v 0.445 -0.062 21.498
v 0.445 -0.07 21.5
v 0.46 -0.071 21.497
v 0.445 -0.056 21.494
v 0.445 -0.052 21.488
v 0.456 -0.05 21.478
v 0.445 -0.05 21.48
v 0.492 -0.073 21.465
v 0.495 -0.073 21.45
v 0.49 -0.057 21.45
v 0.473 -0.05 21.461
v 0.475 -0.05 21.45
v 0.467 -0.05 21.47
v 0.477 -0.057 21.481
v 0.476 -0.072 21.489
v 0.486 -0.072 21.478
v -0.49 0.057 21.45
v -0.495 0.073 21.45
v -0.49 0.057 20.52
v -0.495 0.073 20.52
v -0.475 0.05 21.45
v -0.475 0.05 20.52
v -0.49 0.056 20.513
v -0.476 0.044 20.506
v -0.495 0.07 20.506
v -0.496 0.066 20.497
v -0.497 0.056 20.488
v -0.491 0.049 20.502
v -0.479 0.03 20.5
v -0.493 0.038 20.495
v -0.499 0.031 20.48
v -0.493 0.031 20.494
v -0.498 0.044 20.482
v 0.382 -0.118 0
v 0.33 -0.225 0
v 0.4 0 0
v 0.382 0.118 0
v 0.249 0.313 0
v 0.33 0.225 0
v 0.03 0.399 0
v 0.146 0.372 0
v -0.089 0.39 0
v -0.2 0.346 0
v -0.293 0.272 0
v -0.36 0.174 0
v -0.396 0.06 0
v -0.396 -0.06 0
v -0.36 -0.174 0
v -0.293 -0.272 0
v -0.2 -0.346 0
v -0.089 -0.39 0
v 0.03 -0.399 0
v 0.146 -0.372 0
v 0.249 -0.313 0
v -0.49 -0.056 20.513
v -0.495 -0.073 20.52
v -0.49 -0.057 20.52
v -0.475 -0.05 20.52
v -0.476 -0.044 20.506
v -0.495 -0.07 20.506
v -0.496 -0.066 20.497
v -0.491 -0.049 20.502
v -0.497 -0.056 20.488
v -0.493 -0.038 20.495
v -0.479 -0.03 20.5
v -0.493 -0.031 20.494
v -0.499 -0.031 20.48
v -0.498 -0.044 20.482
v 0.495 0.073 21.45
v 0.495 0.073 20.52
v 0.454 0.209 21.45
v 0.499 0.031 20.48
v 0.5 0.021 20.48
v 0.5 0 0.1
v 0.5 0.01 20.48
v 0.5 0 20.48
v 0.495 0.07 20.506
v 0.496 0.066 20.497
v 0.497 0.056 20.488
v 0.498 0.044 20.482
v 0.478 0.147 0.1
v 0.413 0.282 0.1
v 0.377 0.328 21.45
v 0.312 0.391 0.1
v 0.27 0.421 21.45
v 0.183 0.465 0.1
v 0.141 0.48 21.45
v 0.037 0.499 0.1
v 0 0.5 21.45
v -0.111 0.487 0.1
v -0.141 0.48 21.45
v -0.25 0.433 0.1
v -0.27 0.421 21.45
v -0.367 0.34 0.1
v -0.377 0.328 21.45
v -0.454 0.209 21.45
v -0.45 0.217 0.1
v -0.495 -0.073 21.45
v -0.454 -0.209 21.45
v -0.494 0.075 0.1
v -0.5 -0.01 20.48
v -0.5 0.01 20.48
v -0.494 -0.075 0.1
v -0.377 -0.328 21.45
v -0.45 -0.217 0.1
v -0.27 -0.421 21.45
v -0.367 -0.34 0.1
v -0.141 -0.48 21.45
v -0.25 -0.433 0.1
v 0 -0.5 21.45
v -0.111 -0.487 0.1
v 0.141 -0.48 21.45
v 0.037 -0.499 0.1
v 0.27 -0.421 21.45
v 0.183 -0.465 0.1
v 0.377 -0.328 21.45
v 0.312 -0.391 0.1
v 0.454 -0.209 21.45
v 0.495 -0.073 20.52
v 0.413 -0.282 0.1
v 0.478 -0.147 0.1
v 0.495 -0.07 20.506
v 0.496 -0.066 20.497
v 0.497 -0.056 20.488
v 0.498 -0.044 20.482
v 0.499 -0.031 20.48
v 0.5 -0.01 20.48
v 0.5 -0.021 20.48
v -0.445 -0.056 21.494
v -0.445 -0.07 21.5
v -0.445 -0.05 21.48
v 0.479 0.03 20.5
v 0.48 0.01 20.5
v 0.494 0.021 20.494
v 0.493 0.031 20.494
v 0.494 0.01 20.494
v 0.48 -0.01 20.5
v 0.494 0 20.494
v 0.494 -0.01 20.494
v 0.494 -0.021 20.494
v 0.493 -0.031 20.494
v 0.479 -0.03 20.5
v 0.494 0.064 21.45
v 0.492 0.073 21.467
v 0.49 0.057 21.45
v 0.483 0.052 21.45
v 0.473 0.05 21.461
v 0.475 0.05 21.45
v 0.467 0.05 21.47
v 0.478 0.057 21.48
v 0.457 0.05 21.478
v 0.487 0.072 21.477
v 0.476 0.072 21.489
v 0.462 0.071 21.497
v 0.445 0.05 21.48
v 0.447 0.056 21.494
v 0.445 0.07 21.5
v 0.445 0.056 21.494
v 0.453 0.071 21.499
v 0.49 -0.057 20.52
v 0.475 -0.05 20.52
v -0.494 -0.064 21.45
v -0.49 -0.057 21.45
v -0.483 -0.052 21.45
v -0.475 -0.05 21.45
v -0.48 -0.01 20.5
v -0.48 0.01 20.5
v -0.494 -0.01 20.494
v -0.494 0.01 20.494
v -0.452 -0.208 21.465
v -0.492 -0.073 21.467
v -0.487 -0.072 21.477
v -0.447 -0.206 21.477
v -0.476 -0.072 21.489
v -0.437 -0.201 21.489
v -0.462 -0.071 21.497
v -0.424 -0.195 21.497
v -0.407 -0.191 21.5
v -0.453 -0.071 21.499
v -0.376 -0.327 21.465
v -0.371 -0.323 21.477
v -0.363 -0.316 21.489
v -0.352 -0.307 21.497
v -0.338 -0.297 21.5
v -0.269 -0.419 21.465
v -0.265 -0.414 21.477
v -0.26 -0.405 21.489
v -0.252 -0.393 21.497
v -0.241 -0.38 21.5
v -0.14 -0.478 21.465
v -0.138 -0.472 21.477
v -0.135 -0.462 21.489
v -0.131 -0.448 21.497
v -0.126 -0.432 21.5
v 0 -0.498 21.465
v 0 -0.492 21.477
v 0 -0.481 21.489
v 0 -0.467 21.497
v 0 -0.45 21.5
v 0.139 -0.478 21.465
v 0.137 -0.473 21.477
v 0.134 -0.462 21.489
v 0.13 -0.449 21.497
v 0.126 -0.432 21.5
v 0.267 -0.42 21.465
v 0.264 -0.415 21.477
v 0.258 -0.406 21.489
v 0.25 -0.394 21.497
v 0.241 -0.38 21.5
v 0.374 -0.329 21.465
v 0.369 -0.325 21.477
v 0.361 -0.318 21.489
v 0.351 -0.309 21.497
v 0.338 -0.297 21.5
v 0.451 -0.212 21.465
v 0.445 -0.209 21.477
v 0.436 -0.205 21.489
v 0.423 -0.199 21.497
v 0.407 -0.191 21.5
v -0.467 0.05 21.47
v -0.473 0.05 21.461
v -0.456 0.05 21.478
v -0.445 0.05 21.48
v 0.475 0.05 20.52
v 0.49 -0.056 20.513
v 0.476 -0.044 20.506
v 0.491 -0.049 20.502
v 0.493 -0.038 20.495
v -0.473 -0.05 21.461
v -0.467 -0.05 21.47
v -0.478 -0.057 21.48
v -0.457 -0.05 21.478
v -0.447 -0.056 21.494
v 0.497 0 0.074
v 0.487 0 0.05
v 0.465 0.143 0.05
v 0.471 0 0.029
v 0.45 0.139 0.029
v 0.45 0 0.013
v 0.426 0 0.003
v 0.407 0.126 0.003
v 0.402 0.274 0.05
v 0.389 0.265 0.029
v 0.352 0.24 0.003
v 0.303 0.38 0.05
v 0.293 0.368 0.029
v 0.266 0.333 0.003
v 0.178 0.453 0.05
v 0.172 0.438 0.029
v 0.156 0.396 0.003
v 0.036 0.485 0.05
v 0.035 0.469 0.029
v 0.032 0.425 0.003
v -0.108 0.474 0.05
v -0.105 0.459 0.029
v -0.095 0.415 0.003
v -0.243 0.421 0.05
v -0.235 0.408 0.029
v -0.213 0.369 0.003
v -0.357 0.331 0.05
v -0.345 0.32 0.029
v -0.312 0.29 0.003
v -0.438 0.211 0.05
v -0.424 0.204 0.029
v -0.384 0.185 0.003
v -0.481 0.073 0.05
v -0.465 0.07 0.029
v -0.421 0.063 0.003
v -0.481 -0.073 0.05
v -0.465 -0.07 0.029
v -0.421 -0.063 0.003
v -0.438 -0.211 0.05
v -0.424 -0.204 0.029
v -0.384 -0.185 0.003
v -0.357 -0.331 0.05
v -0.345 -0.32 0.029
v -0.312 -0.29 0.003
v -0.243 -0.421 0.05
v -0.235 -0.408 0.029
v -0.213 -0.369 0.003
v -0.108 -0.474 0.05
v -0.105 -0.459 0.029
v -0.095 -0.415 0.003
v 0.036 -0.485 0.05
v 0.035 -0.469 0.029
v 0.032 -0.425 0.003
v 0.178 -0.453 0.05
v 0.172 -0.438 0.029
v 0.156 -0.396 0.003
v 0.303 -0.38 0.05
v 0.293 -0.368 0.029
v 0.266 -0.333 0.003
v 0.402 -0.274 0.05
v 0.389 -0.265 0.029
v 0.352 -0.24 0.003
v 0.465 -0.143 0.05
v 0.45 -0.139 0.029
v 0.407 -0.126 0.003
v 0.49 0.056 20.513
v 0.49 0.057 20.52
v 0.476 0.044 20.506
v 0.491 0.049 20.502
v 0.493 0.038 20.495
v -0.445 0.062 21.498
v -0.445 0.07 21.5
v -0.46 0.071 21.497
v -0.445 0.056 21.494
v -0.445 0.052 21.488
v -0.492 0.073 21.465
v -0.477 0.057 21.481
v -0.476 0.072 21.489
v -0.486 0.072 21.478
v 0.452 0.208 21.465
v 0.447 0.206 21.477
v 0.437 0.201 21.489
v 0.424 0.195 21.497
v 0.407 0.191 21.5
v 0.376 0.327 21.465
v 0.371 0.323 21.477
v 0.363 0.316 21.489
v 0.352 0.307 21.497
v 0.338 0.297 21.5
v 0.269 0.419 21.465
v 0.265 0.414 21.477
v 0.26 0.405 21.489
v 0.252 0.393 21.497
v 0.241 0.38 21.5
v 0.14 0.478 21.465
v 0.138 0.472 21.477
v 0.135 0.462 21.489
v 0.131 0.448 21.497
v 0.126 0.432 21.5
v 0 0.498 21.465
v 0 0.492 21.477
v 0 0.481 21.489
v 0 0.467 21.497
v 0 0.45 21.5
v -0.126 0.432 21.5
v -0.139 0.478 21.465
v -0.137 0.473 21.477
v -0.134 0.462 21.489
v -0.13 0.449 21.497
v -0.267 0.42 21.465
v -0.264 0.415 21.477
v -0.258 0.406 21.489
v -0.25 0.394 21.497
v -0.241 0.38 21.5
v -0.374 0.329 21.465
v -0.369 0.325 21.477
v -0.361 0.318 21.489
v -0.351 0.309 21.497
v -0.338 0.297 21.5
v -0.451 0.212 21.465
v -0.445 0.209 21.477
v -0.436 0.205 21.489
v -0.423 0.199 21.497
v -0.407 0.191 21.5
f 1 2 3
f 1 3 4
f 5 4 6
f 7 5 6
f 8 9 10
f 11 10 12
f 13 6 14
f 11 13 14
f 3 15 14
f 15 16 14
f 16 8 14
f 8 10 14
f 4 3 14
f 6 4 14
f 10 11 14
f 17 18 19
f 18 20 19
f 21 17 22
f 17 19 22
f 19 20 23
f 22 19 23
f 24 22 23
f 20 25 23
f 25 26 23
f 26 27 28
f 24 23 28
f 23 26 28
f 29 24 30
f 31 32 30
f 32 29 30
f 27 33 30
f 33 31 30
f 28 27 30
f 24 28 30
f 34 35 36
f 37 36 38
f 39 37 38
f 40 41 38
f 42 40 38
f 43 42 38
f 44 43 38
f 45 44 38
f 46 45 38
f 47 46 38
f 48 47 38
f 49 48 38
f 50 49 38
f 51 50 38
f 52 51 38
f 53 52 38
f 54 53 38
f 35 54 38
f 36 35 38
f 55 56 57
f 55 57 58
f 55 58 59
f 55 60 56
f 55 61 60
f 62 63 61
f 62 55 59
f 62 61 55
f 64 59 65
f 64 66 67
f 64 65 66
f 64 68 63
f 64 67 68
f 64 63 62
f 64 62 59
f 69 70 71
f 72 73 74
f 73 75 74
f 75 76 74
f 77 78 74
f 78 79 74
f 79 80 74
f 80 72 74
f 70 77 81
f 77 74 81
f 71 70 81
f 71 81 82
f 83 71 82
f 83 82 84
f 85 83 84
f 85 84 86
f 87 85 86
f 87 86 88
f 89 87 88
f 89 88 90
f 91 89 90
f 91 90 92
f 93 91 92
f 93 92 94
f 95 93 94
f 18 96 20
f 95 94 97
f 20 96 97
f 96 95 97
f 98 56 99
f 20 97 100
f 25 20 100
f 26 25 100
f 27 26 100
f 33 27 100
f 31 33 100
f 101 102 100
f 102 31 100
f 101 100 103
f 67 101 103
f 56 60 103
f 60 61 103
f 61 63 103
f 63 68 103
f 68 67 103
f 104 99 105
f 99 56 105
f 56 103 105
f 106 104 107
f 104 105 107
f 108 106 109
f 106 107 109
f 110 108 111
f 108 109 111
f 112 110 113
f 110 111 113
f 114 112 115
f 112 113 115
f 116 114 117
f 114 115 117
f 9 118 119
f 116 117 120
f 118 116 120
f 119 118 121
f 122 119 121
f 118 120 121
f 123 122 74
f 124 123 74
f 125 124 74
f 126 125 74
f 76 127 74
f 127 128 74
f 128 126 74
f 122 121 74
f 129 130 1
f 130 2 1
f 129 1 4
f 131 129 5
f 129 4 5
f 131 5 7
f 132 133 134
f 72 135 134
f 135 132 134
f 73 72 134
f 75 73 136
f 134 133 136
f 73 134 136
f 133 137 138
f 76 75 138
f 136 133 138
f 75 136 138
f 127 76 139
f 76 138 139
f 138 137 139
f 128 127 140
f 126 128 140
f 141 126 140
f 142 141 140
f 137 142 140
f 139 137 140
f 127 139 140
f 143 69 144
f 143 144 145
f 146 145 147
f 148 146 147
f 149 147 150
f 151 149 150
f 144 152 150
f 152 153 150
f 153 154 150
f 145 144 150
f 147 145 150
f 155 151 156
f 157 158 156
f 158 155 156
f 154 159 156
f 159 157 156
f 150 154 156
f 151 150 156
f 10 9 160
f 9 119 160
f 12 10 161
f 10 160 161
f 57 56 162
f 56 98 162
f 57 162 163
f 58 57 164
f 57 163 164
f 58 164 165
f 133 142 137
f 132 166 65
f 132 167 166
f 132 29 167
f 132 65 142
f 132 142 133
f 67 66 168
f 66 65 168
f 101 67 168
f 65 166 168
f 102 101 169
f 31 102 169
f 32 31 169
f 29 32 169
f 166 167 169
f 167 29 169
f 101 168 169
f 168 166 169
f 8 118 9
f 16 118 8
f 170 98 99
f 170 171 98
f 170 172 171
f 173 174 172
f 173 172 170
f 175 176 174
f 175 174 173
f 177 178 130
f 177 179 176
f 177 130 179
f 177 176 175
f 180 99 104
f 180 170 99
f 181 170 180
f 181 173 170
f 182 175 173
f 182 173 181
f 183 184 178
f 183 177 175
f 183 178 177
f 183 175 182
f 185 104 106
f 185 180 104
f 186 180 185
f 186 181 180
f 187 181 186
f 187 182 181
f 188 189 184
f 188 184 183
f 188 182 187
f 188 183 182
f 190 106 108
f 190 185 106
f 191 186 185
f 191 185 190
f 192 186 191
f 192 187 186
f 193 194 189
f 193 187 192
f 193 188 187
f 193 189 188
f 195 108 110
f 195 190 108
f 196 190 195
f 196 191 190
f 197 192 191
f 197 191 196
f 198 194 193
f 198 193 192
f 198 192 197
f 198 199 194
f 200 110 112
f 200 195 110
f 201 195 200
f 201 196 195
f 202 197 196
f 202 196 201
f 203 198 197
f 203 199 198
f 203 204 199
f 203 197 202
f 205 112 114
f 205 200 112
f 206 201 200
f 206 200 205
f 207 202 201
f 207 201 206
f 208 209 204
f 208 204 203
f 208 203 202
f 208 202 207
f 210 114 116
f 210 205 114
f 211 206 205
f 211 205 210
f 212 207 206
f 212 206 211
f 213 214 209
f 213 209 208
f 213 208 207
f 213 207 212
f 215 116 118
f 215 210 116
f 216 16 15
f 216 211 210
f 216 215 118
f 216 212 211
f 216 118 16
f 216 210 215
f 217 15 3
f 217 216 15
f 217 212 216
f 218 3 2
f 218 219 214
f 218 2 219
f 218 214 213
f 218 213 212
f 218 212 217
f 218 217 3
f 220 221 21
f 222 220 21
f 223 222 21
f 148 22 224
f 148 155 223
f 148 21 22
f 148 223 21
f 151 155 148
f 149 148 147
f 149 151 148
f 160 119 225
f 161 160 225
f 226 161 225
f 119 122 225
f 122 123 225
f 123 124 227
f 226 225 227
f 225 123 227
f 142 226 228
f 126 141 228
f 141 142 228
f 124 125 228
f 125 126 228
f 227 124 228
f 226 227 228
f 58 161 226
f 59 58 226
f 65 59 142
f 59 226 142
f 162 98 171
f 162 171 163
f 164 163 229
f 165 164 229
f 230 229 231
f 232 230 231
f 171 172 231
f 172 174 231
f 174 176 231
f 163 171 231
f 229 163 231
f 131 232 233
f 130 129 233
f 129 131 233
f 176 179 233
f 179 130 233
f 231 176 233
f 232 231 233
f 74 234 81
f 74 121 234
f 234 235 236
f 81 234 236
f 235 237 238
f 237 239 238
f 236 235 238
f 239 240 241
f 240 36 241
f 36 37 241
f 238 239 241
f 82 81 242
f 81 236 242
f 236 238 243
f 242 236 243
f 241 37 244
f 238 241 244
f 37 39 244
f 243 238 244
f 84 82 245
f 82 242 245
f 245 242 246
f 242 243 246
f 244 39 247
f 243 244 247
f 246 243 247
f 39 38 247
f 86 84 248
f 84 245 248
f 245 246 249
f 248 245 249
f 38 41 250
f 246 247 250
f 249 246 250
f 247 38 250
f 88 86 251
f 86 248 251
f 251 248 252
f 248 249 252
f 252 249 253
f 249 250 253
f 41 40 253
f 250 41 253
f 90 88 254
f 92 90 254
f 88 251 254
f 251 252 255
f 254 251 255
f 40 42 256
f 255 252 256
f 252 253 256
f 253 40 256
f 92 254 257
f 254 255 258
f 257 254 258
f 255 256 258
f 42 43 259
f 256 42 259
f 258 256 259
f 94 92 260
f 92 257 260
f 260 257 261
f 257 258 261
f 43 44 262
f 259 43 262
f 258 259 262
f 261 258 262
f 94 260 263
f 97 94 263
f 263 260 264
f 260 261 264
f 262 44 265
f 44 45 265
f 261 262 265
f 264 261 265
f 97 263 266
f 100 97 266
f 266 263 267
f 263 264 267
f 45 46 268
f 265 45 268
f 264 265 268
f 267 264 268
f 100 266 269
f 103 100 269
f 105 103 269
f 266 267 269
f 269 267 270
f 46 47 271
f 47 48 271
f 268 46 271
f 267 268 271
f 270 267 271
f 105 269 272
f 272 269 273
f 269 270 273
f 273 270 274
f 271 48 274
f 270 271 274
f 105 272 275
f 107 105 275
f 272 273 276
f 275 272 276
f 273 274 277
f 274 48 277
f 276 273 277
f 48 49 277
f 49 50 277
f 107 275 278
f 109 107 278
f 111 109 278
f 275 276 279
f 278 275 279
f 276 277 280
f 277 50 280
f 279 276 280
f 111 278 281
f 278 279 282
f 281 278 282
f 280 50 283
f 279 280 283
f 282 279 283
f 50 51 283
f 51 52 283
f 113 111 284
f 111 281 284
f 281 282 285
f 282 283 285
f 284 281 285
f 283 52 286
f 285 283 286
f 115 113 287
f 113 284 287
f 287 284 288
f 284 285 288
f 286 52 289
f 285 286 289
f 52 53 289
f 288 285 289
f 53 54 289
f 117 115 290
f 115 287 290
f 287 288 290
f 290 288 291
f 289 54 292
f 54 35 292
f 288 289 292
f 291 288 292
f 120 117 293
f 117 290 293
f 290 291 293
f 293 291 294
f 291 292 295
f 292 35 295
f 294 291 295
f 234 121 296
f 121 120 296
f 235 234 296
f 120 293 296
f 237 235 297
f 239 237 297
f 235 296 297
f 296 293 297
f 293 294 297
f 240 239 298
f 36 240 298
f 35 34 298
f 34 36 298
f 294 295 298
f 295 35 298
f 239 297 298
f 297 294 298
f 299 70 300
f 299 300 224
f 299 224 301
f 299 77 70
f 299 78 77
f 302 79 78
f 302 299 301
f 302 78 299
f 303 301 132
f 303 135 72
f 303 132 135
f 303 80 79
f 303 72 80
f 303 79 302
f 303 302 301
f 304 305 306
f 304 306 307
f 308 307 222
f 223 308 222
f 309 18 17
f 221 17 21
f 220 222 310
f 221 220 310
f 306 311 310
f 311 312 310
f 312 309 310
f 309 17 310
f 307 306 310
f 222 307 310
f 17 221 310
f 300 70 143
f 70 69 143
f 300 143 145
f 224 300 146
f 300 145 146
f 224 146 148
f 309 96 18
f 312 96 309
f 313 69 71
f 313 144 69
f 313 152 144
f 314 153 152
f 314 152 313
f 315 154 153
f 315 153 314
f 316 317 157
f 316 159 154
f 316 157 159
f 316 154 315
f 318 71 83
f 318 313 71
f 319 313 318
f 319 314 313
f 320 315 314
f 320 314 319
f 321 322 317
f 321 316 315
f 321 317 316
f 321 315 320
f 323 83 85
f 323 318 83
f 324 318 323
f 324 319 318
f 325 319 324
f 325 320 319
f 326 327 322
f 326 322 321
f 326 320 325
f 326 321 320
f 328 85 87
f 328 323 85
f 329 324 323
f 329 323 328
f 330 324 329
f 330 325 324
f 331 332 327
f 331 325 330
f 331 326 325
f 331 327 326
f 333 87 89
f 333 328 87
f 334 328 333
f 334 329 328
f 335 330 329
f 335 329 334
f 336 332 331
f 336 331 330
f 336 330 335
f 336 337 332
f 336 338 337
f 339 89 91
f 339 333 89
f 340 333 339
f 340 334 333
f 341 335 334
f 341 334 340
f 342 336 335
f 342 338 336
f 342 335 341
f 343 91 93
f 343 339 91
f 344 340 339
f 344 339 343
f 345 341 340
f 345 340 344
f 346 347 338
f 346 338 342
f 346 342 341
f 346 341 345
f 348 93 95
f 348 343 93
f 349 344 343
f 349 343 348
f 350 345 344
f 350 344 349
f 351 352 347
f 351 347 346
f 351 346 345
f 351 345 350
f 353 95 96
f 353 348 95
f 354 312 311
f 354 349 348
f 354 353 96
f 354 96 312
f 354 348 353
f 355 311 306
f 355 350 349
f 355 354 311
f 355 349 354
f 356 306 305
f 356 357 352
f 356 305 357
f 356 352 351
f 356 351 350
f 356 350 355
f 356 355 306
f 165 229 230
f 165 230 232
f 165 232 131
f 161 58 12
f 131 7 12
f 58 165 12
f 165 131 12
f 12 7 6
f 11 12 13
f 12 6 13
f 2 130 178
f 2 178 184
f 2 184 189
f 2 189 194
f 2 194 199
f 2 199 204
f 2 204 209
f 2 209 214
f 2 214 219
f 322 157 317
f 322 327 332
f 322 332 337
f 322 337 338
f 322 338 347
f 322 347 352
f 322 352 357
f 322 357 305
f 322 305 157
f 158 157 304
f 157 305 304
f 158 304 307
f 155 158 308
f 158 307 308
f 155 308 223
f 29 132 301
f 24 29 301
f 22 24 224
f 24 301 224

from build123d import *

# Parameters (mm, degrees)
SKETCH1_R           = 0.5
BOSS_EXTRUDE1_DEPTH = 21.5
SKETCH2_W           = 1.609185638
SKETCH2_H           = 0.1
CUT_EXTRUDE1_DEPTH  = 1
FILLET1_R           = 0.1
FILLET2_R           = 0.05
FILLET3_R           = 0.02


with BuildPart() as part:
    # Sketch1 → Boss-Extrude1 (new body)
    with BuildSketch(Plane.XY):
        Circle(SKETCH1_R)
    extrude(amount=BOSS_EXTRUDE1_DEPTH)

    # Sketch2 → Cut-Extrude1 (cut)
    with BuildSketch(Plane.XY.offset(21.5)):
        with Locations((0.143244603, 0)):
            Rectangle(SKETCH2_W, SKETCH2_H)
    extrude(amount=-CUT_EXTRUDE1_DEPTH, mode=Mode.SUBTRACT)

    # Fillet1
    fillet1_edges = [part.edges().sort_by_distance(p)[0] for p in [
        (-0.5, 0, 0),
    ]]
    fillet(fillet1_edges, radius=FILLET1_R)

    # Fillet2
    fillet2_edges = [part.edges().sort_by_distance(p)[0] for p in [
        (0, 0.5, 21.5),
        (0, -0.5, 21.5),
    ]]
    fillet(fillet2_edges, radius=FILLET2_R)

    # Fillet3
    fillet3_edges = [part.edges().sort_by_distance(p)[0] for p in [
        (0, 0.05, 20.5),
        (-0.497493719, 0.05, 20.975),
        (0, -0.05, 20.5),
        (0.497493719, -0.05, 20.975),
        (0, -0.05, 21.5),
        (-0.497493719, -0.05, 20.975),
        (-0.482618709, -0.05, 21.485508179),
        (0.482720177, -0.05, 21.485407837),
        (0.497493719, 0.05, 20.975),
        (0, 0.05, 21.5),
        (0.482618709, 0.05, 21.485508179),
        (-0.482720177, 0.05, 21.485407837),
        (0.499373037, -0.025031388, 20.5),
        (-0.5, 0, 20.5),
    ]]
    fillet(fillet3_edges, radius=FILLET3_R)


solid = part.part
